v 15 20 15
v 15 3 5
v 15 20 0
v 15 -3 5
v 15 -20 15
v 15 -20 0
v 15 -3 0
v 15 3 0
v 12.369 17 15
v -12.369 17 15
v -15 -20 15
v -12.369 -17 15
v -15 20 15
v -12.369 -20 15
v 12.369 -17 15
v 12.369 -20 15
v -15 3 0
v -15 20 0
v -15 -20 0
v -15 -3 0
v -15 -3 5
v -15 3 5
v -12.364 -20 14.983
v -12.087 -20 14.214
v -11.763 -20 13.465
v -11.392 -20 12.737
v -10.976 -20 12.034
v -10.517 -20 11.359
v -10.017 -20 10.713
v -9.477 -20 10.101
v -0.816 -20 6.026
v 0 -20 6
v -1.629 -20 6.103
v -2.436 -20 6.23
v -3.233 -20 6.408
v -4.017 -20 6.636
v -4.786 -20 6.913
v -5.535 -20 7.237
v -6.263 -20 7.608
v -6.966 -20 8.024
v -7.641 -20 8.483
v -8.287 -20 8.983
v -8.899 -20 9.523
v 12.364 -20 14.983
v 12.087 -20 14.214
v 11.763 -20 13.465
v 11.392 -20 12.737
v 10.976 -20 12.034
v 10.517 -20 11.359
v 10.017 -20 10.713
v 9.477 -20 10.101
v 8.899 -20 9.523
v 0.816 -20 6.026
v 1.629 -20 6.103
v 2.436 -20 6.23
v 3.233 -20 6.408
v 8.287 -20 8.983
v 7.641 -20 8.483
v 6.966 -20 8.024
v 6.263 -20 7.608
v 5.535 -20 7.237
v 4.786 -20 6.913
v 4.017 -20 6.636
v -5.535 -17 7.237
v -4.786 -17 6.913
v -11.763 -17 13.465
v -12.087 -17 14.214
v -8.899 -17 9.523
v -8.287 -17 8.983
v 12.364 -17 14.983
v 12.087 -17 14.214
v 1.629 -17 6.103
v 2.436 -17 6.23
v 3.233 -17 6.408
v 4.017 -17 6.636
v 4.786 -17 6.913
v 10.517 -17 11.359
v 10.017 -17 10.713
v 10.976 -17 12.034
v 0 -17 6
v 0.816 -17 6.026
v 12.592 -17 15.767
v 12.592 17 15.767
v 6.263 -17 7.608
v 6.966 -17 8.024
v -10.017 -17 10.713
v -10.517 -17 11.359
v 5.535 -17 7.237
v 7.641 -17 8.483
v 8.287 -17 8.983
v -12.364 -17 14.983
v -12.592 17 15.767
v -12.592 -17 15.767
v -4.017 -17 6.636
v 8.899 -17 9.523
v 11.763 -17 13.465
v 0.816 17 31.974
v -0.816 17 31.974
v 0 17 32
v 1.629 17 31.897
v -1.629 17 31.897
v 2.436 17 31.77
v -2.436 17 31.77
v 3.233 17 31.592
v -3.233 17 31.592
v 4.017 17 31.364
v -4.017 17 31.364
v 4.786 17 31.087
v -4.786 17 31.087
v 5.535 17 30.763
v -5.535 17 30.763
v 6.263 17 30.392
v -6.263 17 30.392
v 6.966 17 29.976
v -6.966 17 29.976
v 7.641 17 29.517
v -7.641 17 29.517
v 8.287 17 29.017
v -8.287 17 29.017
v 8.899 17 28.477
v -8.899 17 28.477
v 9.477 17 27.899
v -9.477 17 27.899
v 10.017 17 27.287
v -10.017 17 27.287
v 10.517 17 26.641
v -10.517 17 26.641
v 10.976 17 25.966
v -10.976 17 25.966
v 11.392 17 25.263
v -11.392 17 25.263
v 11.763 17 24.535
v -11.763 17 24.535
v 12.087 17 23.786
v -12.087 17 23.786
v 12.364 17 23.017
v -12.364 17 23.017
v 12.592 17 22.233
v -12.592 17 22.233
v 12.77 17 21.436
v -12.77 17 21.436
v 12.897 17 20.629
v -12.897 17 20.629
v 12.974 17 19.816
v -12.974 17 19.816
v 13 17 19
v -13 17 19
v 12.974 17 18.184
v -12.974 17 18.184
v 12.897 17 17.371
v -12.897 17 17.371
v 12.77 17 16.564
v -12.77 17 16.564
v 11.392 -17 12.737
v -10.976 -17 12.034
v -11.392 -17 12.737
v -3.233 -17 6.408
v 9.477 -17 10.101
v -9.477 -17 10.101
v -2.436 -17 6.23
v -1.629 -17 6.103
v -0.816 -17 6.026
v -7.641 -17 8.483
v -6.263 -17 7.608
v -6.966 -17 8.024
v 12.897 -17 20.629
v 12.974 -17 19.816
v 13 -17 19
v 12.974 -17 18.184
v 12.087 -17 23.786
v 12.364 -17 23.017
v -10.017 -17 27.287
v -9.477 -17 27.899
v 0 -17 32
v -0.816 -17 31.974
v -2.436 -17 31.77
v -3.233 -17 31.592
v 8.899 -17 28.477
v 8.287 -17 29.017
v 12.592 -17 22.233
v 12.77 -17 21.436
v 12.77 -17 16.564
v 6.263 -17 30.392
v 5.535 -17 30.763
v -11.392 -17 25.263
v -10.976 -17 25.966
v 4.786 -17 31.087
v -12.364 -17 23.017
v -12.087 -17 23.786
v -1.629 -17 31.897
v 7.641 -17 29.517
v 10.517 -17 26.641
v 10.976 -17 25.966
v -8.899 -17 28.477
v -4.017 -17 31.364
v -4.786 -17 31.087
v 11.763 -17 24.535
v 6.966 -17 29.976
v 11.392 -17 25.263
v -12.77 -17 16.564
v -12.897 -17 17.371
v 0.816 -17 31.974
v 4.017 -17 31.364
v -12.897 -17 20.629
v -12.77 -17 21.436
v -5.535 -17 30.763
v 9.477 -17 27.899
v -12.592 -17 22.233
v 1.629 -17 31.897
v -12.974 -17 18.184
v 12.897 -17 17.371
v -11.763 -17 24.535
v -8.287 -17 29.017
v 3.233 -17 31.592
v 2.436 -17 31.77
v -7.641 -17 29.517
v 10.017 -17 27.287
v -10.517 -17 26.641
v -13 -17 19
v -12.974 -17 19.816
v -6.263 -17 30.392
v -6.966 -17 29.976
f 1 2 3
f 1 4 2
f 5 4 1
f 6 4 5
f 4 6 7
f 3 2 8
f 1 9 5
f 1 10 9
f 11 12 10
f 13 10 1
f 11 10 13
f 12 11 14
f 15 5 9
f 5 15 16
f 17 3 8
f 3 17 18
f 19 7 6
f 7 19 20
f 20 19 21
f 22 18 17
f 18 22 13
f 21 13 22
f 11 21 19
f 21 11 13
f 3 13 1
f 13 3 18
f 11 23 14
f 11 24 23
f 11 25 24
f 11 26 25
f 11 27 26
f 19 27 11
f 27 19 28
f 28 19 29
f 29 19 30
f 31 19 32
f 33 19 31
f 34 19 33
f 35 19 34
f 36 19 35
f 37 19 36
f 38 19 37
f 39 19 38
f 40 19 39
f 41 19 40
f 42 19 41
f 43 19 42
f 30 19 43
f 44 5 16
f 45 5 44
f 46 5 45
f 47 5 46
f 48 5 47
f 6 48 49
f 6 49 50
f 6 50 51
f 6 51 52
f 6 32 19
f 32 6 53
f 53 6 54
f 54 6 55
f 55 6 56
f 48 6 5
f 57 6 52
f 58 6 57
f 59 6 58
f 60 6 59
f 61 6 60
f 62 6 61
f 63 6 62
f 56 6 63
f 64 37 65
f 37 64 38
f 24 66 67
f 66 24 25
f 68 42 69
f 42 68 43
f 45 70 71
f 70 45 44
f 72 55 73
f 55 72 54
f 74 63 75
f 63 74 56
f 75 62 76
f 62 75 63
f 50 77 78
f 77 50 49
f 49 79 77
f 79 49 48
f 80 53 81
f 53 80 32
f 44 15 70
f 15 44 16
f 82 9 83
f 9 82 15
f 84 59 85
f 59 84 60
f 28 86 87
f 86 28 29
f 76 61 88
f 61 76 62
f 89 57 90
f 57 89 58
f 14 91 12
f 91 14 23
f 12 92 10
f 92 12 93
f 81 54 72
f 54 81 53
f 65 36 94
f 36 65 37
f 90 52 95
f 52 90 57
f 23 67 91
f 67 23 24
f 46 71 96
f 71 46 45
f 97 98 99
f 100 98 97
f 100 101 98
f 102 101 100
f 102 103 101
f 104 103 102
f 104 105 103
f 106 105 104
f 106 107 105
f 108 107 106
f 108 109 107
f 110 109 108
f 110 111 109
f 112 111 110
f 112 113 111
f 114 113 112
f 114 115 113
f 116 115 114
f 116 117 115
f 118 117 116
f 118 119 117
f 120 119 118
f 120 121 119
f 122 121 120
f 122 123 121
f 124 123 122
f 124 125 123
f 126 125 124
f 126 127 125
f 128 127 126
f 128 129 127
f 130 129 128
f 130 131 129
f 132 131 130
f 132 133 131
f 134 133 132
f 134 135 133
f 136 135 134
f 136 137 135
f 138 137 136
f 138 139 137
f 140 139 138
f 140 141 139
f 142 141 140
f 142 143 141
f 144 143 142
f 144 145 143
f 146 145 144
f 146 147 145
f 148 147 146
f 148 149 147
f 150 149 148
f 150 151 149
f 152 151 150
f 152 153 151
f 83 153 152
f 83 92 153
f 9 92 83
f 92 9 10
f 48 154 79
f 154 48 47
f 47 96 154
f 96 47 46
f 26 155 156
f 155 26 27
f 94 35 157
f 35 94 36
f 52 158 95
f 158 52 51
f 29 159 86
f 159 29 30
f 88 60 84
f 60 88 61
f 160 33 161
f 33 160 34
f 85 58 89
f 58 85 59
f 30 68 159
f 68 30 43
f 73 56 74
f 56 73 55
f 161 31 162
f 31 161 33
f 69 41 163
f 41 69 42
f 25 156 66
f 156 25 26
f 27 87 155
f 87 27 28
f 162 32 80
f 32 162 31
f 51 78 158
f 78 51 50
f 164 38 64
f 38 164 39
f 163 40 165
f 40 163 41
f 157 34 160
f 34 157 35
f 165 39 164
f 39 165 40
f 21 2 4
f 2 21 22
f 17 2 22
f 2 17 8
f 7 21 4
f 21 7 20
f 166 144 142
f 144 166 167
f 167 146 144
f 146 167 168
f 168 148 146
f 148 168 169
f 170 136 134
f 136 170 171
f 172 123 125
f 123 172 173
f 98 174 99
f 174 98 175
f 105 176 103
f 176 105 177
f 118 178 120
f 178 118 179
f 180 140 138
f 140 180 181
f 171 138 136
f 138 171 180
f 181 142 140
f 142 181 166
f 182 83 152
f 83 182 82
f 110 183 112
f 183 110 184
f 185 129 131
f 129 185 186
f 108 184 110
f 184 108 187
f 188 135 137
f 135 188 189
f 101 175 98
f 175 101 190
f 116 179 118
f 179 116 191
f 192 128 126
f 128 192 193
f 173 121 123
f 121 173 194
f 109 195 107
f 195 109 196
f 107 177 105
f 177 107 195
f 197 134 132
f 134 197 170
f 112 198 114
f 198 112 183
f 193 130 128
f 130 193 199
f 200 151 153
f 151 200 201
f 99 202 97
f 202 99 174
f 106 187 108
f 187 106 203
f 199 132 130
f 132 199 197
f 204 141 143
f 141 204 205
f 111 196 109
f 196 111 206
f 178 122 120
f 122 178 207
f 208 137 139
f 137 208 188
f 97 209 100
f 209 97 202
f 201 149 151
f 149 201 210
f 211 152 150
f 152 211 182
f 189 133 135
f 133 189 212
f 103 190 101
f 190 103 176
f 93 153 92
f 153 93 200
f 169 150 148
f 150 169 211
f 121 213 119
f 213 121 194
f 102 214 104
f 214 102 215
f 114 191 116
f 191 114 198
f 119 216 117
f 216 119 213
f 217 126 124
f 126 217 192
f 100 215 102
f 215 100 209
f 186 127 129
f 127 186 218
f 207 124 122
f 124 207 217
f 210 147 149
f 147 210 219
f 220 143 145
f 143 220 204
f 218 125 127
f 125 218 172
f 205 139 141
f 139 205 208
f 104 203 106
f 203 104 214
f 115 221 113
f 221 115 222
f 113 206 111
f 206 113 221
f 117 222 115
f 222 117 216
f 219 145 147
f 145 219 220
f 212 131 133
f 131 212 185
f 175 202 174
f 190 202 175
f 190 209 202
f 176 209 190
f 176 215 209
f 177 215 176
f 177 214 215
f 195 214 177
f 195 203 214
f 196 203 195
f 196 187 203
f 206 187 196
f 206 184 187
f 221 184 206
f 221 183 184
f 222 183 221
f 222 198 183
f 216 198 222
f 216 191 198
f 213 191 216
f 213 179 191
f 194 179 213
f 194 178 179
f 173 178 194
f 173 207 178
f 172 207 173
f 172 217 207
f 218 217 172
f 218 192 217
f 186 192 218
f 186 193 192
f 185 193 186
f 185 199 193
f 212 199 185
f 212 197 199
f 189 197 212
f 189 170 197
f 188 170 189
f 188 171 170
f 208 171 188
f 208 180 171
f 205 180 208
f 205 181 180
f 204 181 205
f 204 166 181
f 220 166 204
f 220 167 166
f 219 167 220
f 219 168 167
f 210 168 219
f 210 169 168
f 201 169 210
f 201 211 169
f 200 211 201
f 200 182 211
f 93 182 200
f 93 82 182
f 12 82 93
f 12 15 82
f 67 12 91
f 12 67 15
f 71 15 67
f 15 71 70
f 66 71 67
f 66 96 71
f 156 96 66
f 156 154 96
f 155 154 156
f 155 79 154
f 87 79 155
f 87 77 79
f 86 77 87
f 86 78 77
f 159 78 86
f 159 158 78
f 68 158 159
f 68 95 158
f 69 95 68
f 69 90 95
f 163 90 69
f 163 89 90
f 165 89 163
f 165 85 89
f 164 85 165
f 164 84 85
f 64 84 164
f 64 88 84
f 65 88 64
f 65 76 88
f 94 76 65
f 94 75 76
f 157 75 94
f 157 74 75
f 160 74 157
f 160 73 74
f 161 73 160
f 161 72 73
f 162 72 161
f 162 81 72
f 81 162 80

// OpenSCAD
//Geophone support RTC 10Hz

//Dimensions-------------------------------------------------
//All in mm

// Geophone dimensions
hg=34;   //height
dg=26;  //diameter 

// support
bases=40;

hs=15;
w=9;
e=6;

//holes
dh=3;
th=27;

//groove
gw=6;
gd=10;
gdd=3;
//--------------------------------------------------------------
$fn=100;//resolution

module Make_body() {
difference(){
union(){
translate([0,0,hs/2]) cube([bases-10,bases,hs],center=true);
translate([0,0,dg/4]) cube([bases-10,bases,dg/2],center=true);
}
translate([0,-15,e+dg/2])  rotate([90,0,0]) cylinder(h=hg+30,d=dg,center=true);
}
}


module Make_holes() {
union(){
rotate([0,0,45])translate([th,0,0]) cylinder(h=3*hs,d=dh,center=true);
rotate([0,0,135])translate([th,0,0]) cylinder(h=3*hs,d=dh,center=true);
rotate([0,0,225])translate([th,0,0]) cylinder(h=3*hs,d=dh,center=true);
rotate([0,0,315])translate([th,0,0]) cylinder(h=3*hs,d=dh,center=true);
}}

module Make_groove() {
    union(){
    cube([100,gw,gd],center=true);
    //rotate([0,0,90]) cube([100,gw,gd],center=true);
}}

module Make_groove_holes(){
   union(){
    translate([(gdd+bases)/2-10,0,0])rotate([0,90,0])cube([100,gw,gdd],center=true);
    translate([-(gdd+bases)/2+10,0,0])rotate([0,90,0])cube([100,gw,gdd],center=true);
}}


/*
color( "blue", 1.0 ) {
Make_groove_holes();
}
*/


difference(){
Make_body();
Make_groove();
}



color( "green", 1.0 ) {
translate([0,0,e+dg/2])  rotate([90,0,0])cylinder(h=hg,d=dg,center=true);
}
